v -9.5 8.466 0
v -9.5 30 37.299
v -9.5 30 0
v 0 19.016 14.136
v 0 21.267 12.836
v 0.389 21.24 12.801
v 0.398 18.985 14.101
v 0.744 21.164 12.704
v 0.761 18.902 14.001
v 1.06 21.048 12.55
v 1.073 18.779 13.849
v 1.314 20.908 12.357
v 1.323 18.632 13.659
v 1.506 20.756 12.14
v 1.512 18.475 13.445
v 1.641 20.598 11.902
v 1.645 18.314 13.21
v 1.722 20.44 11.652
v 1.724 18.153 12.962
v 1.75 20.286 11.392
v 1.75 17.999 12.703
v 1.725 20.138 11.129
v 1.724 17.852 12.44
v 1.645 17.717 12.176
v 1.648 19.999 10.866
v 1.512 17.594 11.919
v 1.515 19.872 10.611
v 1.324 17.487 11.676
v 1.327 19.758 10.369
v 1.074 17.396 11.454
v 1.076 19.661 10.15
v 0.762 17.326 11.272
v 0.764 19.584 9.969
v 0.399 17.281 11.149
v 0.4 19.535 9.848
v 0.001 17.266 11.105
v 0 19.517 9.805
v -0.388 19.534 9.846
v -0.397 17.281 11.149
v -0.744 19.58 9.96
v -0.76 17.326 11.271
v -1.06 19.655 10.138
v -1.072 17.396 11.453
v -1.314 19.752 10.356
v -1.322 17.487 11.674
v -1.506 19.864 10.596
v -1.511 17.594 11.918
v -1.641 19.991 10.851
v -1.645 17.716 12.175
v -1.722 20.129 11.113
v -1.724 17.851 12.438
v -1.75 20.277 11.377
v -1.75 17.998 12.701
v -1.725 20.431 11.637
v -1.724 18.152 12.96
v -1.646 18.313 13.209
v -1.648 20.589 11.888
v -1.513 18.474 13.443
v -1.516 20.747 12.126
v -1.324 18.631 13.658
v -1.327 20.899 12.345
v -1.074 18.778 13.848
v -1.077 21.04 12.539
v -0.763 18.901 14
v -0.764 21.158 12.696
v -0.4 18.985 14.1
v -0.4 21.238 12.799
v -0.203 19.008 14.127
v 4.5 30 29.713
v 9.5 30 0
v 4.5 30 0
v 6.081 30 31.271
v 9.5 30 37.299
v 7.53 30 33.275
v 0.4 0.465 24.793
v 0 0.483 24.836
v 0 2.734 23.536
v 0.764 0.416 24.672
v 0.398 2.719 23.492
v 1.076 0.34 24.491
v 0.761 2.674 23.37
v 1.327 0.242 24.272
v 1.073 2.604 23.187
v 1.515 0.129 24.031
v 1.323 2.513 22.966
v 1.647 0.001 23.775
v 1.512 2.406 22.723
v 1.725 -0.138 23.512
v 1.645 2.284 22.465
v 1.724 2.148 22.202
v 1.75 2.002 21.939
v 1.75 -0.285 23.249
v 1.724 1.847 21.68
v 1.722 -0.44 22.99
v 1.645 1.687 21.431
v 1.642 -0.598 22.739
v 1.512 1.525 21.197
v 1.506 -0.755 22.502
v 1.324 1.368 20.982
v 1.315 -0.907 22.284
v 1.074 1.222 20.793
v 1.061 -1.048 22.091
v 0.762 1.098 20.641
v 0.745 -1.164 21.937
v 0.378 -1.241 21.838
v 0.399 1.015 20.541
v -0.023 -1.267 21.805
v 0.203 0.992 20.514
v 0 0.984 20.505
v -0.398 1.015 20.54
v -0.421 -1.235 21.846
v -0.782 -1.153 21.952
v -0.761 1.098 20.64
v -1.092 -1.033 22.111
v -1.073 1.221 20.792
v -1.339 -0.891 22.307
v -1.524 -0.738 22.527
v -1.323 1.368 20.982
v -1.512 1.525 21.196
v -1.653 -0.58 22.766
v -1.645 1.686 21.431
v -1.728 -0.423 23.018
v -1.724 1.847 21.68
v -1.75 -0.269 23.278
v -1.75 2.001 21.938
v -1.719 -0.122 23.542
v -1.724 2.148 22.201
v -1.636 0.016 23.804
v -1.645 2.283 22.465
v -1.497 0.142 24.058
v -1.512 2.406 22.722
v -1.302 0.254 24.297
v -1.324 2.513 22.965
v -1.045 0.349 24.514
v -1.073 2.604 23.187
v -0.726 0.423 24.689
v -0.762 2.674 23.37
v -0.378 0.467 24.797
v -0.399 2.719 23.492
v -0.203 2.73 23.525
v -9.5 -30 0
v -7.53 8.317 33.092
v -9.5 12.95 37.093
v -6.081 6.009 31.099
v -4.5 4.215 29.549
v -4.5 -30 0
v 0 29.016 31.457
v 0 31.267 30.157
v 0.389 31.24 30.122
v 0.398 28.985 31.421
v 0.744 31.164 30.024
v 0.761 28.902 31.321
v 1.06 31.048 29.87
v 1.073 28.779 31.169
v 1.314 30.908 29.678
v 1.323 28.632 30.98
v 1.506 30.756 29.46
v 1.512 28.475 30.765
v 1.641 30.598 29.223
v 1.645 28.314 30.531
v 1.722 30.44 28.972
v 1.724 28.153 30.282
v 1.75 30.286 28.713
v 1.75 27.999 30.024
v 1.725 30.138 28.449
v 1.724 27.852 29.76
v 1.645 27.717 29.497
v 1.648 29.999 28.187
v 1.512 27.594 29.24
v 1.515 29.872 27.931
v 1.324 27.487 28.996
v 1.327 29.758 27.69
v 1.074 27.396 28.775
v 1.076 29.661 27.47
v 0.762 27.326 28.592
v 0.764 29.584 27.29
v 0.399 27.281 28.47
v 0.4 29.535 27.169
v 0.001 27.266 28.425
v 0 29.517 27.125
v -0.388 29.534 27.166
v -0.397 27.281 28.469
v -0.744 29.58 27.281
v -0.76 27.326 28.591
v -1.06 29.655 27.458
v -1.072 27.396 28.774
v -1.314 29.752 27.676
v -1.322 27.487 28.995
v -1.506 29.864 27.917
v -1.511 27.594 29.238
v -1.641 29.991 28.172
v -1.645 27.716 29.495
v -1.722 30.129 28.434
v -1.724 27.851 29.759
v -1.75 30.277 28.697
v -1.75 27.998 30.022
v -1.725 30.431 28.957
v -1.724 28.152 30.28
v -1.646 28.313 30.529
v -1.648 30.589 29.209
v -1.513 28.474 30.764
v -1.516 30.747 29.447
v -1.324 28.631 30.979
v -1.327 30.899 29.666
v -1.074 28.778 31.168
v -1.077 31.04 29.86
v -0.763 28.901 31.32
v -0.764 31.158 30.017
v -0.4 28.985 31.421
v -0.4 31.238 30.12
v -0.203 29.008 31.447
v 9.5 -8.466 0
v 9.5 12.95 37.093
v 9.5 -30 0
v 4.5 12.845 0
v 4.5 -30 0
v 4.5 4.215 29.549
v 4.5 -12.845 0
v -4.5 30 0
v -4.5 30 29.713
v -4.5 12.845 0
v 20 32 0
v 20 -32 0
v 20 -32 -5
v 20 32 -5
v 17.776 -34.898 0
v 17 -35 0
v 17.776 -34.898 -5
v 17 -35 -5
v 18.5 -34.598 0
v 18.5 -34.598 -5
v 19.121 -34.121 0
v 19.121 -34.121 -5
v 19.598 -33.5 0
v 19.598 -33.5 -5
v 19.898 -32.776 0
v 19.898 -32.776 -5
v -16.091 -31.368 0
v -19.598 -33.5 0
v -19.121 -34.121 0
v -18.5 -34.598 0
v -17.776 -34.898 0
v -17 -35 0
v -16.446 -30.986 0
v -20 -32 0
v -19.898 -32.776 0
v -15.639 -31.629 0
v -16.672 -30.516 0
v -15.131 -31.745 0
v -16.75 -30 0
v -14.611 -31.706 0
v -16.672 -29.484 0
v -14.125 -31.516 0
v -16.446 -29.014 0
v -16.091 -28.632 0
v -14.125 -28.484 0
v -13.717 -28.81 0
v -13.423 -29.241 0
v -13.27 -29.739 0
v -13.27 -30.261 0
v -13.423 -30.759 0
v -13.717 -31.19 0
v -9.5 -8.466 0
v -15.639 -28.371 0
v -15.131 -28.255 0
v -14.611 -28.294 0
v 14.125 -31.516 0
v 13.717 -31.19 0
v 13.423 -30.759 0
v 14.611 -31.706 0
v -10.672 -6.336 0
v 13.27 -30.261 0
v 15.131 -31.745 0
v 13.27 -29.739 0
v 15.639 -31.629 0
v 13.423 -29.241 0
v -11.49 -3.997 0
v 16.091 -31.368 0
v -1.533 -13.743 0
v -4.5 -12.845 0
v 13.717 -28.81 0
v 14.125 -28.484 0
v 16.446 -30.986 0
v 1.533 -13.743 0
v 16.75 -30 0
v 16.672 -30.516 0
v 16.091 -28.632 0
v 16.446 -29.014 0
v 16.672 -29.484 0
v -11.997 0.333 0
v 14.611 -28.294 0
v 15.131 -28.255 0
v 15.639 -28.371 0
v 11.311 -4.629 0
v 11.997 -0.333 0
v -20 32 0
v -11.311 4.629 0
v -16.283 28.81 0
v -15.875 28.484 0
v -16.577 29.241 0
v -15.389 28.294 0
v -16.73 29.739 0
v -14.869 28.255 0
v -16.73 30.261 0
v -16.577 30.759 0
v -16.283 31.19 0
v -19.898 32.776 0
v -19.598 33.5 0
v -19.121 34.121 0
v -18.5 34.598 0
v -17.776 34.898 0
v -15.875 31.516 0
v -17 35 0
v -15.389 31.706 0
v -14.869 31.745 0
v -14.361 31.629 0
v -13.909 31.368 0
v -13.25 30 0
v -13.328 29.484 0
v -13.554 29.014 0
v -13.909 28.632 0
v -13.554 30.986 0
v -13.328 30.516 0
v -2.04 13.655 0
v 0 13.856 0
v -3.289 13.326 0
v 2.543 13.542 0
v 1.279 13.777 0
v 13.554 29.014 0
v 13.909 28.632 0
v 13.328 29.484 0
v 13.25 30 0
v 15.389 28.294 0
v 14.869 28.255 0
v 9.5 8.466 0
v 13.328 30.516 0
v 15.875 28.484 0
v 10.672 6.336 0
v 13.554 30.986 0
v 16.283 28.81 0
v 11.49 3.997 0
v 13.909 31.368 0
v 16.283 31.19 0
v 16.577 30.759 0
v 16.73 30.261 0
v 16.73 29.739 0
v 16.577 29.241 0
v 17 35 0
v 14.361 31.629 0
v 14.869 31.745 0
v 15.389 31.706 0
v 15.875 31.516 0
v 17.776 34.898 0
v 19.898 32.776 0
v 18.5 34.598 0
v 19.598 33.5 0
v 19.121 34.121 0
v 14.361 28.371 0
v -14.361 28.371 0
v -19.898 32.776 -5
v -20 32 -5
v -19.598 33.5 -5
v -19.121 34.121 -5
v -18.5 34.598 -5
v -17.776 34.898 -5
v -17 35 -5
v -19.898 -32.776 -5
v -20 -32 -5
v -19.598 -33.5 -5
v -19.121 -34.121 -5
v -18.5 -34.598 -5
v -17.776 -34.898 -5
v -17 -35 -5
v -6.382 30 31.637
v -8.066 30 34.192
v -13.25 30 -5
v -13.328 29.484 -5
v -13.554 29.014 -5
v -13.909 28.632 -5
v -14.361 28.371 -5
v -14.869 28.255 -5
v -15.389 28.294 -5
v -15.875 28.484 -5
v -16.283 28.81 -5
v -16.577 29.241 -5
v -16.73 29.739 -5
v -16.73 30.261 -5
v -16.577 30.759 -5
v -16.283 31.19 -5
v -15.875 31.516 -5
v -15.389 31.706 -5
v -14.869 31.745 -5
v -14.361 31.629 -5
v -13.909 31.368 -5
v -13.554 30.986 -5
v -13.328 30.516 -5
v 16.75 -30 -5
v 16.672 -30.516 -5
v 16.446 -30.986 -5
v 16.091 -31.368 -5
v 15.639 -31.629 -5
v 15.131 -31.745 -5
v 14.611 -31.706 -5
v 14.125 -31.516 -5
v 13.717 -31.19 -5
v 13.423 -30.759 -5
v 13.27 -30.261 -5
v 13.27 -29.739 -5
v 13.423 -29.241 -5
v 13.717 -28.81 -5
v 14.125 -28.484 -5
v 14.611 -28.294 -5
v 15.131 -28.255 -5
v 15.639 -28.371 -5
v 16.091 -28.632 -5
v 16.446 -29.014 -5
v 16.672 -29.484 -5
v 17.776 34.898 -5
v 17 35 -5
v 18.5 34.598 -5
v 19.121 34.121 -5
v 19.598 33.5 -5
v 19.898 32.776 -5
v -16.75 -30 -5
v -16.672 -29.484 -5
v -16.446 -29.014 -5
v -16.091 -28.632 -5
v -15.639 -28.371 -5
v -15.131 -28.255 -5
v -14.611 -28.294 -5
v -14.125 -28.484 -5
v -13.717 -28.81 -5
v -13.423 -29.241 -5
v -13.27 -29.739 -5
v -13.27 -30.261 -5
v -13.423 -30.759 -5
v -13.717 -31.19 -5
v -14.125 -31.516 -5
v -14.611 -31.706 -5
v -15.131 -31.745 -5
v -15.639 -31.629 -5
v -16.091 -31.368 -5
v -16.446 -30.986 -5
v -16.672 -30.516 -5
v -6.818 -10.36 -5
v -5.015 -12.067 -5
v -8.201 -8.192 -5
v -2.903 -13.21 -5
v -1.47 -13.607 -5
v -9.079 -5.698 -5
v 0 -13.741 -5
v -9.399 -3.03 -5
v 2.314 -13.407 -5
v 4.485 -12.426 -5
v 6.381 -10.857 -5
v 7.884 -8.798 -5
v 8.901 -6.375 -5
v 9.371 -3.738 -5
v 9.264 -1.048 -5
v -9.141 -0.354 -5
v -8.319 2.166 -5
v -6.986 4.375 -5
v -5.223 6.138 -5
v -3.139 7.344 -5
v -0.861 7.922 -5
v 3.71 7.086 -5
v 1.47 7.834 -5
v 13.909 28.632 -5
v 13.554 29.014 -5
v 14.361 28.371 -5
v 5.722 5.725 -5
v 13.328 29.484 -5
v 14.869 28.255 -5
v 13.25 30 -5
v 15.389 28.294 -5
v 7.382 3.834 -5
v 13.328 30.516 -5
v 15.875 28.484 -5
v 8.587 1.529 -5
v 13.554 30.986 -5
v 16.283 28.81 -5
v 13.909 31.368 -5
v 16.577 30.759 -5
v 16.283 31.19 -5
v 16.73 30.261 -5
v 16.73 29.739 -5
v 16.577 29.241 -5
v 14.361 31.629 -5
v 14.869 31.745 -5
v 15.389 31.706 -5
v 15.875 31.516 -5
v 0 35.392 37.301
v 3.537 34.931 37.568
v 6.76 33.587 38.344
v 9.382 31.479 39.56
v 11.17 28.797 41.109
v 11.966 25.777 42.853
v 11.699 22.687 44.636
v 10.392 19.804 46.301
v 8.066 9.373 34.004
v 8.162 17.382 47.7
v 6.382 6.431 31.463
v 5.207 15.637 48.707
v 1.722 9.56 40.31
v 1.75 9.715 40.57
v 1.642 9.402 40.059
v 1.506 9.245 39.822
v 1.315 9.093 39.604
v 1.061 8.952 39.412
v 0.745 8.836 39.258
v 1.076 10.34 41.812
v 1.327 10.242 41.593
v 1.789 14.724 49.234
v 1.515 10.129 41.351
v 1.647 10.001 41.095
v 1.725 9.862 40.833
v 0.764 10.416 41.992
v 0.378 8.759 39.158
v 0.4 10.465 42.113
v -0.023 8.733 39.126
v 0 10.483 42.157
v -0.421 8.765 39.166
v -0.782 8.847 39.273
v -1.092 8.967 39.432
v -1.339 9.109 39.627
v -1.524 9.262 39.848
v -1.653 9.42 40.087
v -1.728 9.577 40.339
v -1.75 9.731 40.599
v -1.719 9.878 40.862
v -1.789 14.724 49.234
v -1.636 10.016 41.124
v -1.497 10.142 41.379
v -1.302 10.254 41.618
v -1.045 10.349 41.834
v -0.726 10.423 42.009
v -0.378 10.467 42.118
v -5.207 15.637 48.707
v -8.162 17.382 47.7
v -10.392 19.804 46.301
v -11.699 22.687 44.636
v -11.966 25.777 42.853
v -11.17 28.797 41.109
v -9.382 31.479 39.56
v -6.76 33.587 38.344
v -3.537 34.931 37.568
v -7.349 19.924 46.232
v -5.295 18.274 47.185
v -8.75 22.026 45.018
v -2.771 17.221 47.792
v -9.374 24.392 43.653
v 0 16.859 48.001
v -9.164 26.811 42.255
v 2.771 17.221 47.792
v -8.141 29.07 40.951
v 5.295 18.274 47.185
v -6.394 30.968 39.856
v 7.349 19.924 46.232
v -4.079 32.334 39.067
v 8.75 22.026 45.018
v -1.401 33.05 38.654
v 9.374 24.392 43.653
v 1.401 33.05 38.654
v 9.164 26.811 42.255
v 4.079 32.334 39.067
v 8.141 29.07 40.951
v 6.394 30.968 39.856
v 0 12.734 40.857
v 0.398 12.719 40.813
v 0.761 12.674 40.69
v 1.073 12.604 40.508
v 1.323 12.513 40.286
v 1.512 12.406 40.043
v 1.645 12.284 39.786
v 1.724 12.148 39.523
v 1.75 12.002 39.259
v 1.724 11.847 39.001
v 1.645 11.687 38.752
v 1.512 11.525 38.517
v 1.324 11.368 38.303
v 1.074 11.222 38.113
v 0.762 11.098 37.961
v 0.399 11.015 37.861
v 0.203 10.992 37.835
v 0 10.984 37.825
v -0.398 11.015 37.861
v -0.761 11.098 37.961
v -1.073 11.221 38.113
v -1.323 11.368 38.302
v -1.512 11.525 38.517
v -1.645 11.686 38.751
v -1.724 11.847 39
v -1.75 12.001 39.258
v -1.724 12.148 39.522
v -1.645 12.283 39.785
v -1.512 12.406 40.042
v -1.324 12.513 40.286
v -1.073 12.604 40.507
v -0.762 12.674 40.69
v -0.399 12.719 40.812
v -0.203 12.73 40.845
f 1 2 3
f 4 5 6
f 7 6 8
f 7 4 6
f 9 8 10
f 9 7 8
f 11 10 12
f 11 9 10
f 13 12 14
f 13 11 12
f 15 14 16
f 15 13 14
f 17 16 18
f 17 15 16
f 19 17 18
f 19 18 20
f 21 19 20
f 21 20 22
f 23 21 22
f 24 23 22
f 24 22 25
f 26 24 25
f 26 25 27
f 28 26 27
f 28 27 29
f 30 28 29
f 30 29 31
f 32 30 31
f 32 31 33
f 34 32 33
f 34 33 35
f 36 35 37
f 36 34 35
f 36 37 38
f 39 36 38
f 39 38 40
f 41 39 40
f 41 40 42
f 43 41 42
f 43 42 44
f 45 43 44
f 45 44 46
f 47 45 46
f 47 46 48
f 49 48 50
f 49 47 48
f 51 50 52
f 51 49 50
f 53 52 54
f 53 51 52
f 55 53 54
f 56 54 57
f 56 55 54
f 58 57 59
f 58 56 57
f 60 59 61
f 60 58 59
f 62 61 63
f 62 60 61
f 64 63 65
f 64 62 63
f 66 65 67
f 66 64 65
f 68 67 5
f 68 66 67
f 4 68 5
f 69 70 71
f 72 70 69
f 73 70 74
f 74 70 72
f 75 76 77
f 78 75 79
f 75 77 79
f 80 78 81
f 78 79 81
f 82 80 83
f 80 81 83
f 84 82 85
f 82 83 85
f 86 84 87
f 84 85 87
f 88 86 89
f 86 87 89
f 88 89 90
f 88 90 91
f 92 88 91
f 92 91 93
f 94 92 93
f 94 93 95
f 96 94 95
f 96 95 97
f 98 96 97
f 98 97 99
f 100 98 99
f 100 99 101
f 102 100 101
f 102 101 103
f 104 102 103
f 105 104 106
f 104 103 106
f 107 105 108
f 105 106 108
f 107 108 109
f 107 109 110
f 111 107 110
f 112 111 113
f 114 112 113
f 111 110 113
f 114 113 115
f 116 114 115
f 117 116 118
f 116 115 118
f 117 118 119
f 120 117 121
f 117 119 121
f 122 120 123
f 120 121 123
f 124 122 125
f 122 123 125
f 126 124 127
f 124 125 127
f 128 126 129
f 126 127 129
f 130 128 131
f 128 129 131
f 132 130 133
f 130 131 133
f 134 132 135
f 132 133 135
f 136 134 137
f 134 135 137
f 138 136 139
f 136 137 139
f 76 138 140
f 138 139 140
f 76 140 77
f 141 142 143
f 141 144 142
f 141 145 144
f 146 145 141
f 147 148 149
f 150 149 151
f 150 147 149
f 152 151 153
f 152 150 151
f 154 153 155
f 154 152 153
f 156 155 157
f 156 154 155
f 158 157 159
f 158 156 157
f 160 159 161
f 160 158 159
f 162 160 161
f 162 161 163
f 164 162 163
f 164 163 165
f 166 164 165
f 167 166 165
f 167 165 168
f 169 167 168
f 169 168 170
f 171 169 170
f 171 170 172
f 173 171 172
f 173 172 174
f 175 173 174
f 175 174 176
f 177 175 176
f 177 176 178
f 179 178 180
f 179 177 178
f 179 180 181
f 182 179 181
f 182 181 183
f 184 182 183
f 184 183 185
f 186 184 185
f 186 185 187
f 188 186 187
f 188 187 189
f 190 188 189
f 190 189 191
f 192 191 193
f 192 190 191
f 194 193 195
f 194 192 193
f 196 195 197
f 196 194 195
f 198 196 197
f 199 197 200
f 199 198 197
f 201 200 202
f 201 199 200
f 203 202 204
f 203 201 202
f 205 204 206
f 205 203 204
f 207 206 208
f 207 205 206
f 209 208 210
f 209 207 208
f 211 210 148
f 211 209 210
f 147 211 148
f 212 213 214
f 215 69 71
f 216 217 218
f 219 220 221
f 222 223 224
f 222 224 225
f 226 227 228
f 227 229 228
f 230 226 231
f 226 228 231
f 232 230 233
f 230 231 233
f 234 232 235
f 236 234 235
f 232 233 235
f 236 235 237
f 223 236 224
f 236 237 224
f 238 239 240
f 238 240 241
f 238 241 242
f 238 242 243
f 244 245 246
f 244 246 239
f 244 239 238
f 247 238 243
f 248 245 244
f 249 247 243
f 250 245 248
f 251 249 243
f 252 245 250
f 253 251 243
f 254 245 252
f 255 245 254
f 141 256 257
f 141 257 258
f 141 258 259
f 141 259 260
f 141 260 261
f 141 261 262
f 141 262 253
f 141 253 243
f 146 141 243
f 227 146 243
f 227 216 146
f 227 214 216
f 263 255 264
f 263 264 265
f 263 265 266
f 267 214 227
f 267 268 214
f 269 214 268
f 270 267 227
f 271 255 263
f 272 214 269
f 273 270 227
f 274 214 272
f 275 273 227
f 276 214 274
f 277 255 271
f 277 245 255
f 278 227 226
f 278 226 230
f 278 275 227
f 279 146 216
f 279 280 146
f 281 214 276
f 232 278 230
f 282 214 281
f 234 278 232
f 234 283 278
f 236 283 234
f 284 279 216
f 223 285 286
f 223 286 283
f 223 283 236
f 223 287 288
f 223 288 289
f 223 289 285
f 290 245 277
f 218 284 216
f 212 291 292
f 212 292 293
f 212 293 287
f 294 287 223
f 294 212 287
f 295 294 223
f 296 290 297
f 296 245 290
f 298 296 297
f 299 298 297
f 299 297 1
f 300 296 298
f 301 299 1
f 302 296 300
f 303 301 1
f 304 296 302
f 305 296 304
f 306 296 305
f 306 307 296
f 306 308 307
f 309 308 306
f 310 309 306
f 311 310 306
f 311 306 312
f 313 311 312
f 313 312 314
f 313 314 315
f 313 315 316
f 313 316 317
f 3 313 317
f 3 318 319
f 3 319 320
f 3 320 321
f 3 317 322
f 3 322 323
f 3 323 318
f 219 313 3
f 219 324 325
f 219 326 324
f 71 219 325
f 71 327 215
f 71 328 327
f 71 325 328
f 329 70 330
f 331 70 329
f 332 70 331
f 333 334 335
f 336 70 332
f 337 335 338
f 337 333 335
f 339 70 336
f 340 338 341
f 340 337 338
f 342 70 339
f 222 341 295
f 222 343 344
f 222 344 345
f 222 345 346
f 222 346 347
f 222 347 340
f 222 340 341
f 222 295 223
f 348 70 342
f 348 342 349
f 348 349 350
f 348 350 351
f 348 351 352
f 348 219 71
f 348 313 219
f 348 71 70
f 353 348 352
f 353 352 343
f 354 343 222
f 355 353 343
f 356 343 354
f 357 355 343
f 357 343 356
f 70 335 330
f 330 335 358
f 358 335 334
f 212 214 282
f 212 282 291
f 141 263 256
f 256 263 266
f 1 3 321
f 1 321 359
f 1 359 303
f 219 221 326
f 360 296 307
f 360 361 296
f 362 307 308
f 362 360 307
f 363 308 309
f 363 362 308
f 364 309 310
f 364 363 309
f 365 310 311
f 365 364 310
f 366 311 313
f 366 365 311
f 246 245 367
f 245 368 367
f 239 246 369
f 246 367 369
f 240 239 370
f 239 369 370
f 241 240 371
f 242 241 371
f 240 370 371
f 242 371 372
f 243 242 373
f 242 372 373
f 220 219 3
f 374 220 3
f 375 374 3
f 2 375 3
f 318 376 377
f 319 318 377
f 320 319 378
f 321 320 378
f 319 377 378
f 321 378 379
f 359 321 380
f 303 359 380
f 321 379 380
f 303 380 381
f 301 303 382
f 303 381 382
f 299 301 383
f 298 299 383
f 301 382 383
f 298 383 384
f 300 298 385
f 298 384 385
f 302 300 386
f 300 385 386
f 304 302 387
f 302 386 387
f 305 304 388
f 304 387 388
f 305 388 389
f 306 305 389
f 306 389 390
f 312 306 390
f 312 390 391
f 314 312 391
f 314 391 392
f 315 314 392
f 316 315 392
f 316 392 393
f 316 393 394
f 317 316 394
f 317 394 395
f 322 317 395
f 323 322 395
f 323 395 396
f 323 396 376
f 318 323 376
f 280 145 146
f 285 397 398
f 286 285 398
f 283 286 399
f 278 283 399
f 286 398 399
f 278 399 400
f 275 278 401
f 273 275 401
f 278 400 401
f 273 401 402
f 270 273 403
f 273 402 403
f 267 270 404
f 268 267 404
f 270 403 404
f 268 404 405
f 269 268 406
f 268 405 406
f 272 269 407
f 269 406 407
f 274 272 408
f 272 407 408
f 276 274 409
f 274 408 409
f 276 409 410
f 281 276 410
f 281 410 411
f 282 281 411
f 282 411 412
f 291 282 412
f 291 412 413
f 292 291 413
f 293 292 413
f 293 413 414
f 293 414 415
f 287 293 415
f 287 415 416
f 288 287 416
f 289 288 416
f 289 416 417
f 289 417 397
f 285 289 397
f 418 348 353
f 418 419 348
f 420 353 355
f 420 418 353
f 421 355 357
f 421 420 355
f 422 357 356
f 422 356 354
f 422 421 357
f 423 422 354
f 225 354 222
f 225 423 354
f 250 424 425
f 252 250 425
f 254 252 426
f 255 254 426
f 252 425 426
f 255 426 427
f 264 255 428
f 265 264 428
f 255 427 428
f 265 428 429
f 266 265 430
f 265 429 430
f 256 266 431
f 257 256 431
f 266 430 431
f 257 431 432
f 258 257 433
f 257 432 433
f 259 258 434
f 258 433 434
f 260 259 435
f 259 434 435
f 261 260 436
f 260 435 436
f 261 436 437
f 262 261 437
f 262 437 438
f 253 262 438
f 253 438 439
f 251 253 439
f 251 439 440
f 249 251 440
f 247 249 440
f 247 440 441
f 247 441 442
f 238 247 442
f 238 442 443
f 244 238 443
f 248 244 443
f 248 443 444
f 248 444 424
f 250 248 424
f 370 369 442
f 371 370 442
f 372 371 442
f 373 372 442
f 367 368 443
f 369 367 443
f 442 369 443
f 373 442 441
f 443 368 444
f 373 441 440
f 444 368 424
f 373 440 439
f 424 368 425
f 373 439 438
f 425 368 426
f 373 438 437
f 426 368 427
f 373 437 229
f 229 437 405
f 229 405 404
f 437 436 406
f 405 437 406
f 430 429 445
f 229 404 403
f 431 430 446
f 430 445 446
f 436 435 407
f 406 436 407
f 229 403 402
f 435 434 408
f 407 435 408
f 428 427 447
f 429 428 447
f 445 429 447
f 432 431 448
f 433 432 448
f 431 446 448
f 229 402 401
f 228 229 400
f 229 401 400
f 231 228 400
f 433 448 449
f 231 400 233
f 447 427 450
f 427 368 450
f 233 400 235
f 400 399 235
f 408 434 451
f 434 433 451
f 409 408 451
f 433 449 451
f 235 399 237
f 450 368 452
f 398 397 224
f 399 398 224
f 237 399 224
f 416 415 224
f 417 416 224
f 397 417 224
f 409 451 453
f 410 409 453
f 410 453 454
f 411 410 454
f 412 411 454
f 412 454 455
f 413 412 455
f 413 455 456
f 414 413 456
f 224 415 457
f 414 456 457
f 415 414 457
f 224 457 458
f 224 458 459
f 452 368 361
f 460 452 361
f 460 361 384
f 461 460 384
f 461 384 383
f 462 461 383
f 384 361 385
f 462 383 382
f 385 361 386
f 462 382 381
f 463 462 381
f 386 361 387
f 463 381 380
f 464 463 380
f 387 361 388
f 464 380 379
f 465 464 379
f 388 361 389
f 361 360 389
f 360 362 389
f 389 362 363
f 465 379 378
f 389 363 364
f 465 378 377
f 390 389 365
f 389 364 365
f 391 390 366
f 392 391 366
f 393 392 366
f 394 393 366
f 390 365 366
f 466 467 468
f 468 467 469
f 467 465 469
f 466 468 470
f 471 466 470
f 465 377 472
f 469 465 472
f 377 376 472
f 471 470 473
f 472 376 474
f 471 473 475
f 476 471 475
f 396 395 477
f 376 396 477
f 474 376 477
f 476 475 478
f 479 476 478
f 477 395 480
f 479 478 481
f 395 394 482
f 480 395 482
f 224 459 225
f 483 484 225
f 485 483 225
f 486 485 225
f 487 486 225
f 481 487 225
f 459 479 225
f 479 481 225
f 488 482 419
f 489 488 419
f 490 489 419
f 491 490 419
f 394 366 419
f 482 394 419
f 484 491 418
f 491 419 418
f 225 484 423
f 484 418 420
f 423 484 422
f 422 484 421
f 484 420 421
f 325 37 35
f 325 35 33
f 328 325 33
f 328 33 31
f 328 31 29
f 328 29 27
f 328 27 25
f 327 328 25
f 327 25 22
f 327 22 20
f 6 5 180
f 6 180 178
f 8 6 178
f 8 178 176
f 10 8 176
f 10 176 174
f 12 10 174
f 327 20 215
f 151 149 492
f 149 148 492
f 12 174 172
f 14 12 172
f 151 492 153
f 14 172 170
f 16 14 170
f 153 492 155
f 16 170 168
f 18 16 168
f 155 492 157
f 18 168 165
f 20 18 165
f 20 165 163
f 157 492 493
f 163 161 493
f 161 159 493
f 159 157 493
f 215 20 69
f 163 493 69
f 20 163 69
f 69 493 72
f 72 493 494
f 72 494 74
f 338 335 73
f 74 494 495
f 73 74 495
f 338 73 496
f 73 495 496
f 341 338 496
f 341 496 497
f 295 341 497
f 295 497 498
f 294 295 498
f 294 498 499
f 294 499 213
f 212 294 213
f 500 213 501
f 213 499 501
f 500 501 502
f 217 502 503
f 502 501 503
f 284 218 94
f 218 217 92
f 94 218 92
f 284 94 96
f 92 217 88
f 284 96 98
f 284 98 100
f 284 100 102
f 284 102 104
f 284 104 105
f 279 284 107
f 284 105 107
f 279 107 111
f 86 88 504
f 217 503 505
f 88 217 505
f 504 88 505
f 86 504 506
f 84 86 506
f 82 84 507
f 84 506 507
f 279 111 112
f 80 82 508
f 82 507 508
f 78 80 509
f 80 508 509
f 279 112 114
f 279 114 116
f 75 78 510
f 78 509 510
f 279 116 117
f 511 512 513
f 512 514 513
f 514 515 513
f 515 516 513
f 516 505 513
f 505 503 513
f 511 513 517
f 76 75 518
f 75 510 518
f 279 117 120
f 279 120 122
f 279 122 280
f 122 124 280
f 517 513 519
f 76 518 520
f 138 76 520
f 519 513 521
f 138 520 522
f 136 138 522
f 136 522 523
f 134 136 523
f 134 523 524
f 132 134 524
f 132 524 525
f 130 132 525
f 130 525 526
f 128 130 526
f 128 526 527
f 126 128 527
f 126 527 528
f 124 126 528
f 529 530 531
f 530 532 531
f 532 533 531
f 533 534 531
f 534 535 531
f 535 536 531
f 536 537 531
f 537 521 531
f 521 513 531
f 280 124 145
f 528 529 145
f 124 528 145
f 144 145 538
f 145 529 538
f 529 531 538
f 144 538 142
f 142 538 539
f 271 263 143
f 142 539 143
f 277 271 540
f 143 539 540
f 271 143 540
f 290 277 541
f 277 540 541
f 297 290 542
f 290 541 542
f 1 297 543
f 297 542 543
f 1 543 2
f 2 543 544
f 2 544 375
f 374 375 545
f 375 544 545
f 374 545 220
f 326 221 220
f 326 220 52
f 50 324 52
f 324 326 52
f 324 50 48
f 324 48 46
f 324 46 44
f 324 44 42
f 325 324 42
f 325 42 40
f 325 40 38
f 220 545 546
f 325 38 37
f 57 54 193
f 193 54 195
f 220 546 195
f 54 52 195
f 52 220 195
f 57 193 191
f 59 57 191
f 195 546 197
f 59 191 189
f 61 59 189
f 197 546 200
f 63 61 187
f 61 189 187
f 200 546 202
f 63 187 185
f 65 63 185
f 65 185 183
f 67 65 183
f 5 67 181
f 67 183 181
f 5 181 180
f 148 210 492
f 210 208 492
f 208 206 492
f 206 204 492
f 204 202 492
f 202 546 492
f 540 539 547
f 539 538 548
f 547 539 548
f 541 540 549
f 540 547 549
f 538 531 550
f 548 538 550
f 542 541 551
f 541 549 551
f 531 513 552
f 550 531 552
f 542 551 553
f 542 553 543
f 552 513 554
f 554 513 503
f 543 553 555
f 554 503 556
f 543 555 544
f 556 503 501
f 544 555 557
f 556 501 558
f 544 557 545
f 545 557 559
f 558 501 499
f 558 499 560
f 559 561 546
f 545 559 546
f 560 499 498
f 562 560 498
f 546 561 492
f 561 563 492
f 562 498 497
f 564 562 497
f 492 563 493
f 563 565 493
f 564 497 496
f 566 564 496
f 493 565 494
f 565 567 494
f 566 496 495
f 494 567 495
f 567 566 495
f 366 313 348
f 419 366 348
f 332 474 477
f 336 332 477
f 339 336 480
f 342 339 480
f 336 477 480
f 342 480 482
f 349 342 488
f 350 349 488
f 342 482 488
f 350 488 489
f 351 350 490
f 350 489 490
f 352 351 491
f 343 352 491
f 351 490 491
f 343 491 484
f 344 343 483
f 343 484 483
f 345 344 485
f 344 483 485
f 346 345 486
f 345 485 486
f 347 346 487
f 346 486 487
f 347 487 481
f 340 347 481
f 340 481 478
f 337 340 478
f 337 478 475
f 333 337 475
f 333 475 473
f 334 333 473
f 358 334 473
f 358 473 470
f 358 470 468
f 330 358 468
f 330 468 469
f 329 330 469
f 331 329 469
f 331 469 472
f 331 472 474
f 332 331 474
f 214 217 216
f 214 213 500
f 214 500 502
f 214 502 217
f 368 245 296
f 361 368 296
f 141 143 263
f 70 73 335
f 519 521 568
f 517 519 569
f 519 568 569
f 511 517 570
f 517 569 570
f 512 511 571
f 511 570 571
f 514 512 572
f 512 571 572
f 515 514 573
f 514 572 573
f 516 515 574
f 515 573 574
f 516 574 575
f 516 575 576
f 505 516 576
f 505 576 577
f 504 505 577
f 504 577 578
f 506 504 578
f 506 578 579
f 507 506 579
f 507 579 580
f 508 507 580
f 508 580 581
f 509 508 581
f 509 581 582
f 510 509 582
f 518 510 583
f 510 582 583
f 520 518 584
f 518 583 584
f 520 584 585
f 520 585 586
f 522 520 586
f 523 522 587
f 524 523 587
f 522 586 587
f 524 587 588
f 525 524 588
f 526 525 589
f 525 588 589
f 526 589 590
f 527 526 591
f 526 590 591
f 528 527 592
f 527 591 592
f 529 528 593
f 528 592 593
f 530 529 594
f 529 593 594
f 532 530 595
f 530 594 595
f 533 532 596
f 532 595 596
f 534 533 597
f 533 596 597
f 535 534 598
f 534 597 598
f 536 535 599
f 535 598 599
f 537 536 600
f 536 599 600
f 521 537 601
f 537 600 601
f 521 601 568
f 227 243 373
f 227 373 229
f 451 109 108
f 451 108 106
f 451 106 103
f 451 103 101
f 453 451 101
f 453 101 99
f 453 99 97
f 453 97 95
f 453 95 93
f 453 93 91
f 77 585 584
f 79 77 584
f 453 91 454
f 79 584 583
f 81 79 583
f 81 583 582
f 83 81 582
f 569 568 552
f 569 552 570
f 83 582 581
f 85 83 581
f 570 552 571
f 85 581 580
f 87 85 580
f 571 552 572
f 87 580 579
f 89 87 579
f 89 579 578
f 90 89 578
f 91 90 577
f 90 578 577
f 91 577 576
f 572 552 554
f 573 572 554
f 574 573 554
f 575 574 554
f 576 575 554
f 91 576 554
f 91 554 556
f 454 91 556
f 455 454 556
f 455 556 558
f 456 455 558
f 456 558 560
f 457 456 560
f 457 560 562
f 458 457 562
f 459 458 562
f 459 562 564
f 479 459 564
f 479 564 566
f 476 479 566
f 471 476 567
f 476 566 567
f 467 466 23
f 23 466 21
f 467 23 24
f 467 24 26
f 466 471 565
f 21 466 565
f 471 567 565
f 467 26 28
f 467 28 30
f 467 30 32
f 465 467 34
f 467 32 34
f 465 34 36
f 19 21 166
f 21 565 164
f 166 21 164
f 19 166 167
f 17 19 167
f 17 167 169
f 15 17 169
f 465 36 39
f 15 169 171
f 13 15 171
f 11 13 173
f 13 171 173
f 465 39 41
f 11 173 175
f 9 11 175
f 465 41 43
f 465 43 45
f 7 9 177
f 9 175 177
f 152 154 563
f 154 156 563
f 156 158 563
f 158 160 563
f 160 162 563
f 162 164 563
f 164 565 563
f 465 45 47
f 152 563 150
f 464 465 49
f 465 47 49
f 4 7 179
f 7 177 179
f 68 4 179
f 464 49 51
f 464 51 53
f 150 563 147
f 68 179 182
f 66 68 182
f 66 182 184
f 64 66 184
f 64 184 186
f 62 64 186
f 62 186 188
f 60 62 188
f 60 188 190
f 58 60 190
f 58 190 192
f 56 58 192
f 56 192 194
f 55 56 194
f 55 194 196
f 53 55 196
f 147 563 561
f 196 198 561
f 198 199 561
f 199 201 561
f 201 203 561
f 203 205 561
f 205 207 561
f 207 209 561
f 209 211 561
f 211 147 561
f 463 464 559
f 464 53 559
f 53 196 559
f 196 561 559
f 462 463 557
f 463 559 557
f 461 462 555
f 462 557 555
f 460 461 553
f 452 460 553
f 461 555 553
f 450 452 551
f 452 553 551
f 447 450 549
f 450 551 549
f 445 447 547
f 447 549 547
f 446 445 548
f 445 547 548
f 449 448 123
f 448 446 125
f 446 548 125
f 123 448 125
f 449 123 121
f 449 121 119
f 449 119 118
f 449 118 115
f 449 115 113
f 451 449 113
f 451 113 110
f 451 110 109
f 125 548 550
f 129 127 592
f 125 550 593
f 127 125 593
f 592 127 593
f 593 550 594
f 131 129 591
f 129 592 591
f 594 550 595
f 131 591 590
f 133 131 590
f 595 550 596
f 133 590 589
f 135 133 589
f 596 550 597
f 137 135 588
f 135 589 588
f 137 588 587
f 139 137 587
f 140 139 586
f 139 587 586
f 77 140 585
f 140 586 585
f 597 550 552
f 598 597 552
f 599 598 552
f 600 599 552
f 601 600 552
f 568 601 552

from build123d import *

# Parameters (mm, degrees)
SKETCH_1_W                           = 40
SKETCH_1_H                           = 70
EXTRUDE_1_DEPTH                      = 5
EXTRUDE_2_REACH                      = 92.62
EXTRUDE_START                        = -50
SKETCH_2_R                           = 12
CUT_EXTRUDE_1_REACH                  = 69.832
SKETCH_4_R                           = 1.75
FILLET_1_R                           = 3
EXTRUDE_START_2                      = 7
EXTRUDE_3_DEPTH                      = 2.5
EXTRUDE_START_3                      = -7
EXTRUDE_4_DEPTH                      = 2.5
SKETCH_5_R                           = 9.4
CUT_EXTRUDE_2_DEPTH                  = 80.580228084
CUT_EXTRUDE_3_REACH                  = 65.9
CUT_EXTRUDE_3_END_RADIUS             = 12
SKETCH_7_R                           = 1.75
CUT_EXTRUDE_3_DIRECTION_2_REACH      = 65.9
CUT_EXTRUDE_3_DIRECTION_2_END_RADIUS = 12


with BuildPart() as part:
    # ｽｹｯﾁ1 → ﾎﾞｽ - 押し出し1 (new body)
    with BuildSketch(Plane.XY):
        Rectangle(SKETCH_1_W, SKETCH_1_H)
    extrude(amount=-EXTRUDE_1_DEPTH)

    # ﾎﾞｽ - 押し出し2: up to this plane
    extrude_2_end = Plane(origin=(0, 0, 0), z_dir=(0, 0, 1))
    # ｽｹｯﾁ2 → ﾎﾞｽ - 押し出し2 (add, up to the surface)
    with BuildSketch(Plane(origin=(0, 0, 0), x_dir=(1, 0, 0), z_dir=(0, -0.49999999999999495, -0.8660254037844416)).offset(EXTRUDE_START), mode=Mode.PRIVATE) as extrude_2_sk1:
        with Locations(Location((0, 0, 0), (0, 0, 270))):
            Circle(SKETCH_2_R)
    extrude_2_tool1 = split(extrude(extrude_2_sk1.sketch, amount=EXTRUDE_2_REACH, mode=Mode.PRIVATE), bisect_by=extrude_2_end, keep=Keep.BOTH, mode=Mode.PRIVATE)
    add(extrude_2_tool1.solids().sort_by_distance((0, 25, 43.30127))[0])

    # ｽｹｯﾁ4 → ｶｯﾄ - 押し出し1 (cut, up to next)
    with BuildSketch(Plane(origin=(0, 0, -5), x_dir=(-1, 0, 0), z_dir=(0, 0, -1)), mode=Mode.PRIVATE) as cut_extrude_1_sk1:
        with Locations((-15, 30)):
            Circle(SKETCH_4_R)
    cut_extrude_1_tool1 = extrude(cut_extrude_1_sk1.sketch, amount=-CUT_EXTRUDE_1_REACH, mode=Mode.PRIVATE) & part.part
    # ｽｹｯﾁ4 → ｶｯﾄ - 押し出し1 (cut, up to next)
    with BuildSketch(Plane(origin=(0, 0, -5), x_dir=(-1, 0, 0), z_dir=(0, 0, -1)), mode=Mode.PRIVATE) as cut_extrude_1_sk2:
        with Locations(Location((15, 30, 0), (0, 0, 180))):
            Circle(SKETCH_4_R)
    cut_extrude_1_tool2 = extrude(cut_extrude_1_sk2.sketch, amount=-CUT_EXTRUDE_1_REACH, mode=Mode.PRIVATE) & part.part
    # ｽｹｯﾁ4 → ｶｯﾄ - 押し出し1 (cut, up to next)
    with BuildSketch(Plane(origin=(0, 0, -5), x_dir=(-1, 0, 0), z_dir=(0, 0, -1)), mode=Mode.PRIVATE) as cut_extrude_1_sk3:
        with Locations((15, -30)):
            Circle(SKETCH_4_R)
    cut_extrude_1_tool3 = extrude(cut_extrude_1_sk3.sketch, amount=-CUT_EXTRUDE_1_REACH, mode=Mode.PRIVATE) & part.part
    # ｽｹｯﾁ4 → ｶｯﾄ - 押し出し1 (cut, up to next)
    with BuildSketch(Plane(origin=(0, 0, -5), x_dir=(-1, 0, 0), z_dir=(0, 0, -1)), mode=Mode.PRIVATE) as cut_extrude_1_sk4:
        with Locations(Location((-15, -30, 0), (0, 0, 180))):
            Circle(SKETCH_4_R)
    cut_extrude_1_tool4 = extrude(cut_extrude_1_sk4.sketch, amount=-CUT_EXTRUDE_1_REACH, mode=Mode.PRIVATE) & part.part
    add(cut_extrude_1_tool1.solids().sort_by_distance((15, 30, -5))[0], mode=Mode.SUBTRACT)
    add(cut_extrude_1_tool2.solids().sort_by_distance((-15, 30, -5))[0], mode=Mode.SUBTRACT)
    add(cut_extrude_1_tool3.solids().sort_by_distance((-15, -30, -5))[0], mode=Mode.SUBTRACT)
    add(cut_extrude_1_tool4.solids().sort_by_distance((15, -30, -5))[0], mode=Mode.SUBTRACT)

    # ﾌｨﾚｯﾄ1
    fillet_1_edges = [part.edges().sort_by_distance(p)[0] for p in [
        (20, -35, -2.5),
        (-20, -35, -2.5),
        (-20, 35, -2.5),
        (20, 35, -2.5),
    ]]
    fillet(fillet_1_edges, radius=FILLET_1_R)

    # ｽｹｯﾁ6 → ﾎﾞｽ - 押し出し3 (add, symmetric)
    with BuildSketch(Plane(origin=(0, 0, 0), x_dir=(0, 0, -1), z_dir=(1, 0, 0)).offset(EXTRUDE_START_2)):
        Polygon((0, 30), (-38, 30), (-38, 14), (0, -30), align=None)
    extrude(amount=EXTRUDE_3_DEPTH, both=True)

    # ｽｹｯﾁ6<2> → ﾎﾞｽ - 押し出し4 (add, symmetric)
    with BuildSketch(Plane(origin=(0, 0, 0), x_dir=(0, 0, -1), z_dir=(1, 0, 0)).offset(EXTRUDE_START_3)):
        Polygon((0, 30), (-38, 30), (-38, 14), (0, -30), align=None)
    extrude(amount=EXTRUDE_4_DEPTH, both=True)

    # ｽｹｯﾁ5 → ｶｯﾄ - 押し出し2 (cut, through all)
    with BuildSketch(Plane(origin=(0, 25, 43.301270189), x_dir=(1, 0, 0), z_dir=(0, 0.49999999999999495, 0.8660254037844416))):
        with Locations(Location((0, 0, 0), (0, 0, 270))):
            Circle(SKETCH_5_R)
    extrude(amount=-CUT_EXTRUDE_2_DEPTH, mode=Mode.SUBTRACT)

    # ｶｯﾄ - 押し出し3: up to this cylinder (the profile starts inside it)
    cut_extrude_3_end = Plane(origin=(0, 14.999999951, 25.980762028), z_dir=(0, 0.4999999999999949, 0.8660254037844416)) * Cylinder(CUT_EXTRUDE_3_END_RADIUS, 176.799999934, mode=Mode.PRIVATE)
    # ｽｹｯﾁ7 → ｶｯﾄ - 押し出し3 (cut, up to the surface)
    with BuildSketch(Plane(origin=(0, 0, 0), x_dir=(1, 0, 0), z_dir=(0, 0.8660254037844416, -0.49999999999999495)), mode=Mode.PRIVATE) as cut_extrude_3_sk1:
        with Locations(Location((0, -20, 0), (0, 0, 270))):
            Circle(SKETCH_7_R)
    cut_extrude_3_tool1 = extrude(cut_extrude_3_sk1.sketch, amount=-CUT_EXTRUDE_3_REACH, mode=Mode.PRIVATE) & cut_extrude_3_end
    add(cut_extrude_3_tool1.solids().sort_by_distance((0, 10, 17.320508))[0], mode=Mode.SUBTRACT)
    # ｽｹｯﾁ7 → ｶｯﾄ - 押し出し3 (cut, up to the surface)
    with BuildSketch(Plane(origin=(0, 0, 0), x_dir=(1, 0, 0), z_dir=(0, 0.8660254037844416, -0.49999999999999495)), mode=Mode.PRIVATE) as cut_extrude_3_sk2:
        with Locations(Location((0, -40, 0), (0, 0, 270))):
            Circle(SKETCH_7_R)
    cut_extrude_3_tool2 = extrude(cut_extrude_3_sk2.sketch, amount=-CUT_EXTRUDE_3_REACH, mode=Mode.PRIVATE) & cut_extrude_3_end
    add(cut_extrude_3_tool2.solids().sort_by_distance((0, 20, 34.641016))[0], mode=Mode.SUBTRACT)

    # ｶｯﾄ - 押し出し3 direction 2: up to this cylinder (the profile starts inside it)
    cut_extrude_3_direction_2_end = Plane(origin=(0, 14.999999951, 25.980762028), z_dir=(0, 0.4999999999999949, 0.8660254037844416)) * Cylinder(CUT_EXTRUDE_3_DIRECTION_2_END_RADIUS, 176.799999934, mode=Mode.PRIVATE)
    # ｽｹｯﾁ7 → ｶｯﾄ - 押し出し3 direction 2 (cut, up to the surface)
    with BuildSketch(Plane(origin=(0, 0, 0), x_dir=(1, 0, 0), z_dir=(0, 0.8660254037844416, -0.49999999999999495)), mode=Mode.PRIVATE) as cut_extrude_3_direction_2_sk1:
        with Locations(Location((0, -20, 0), (0, 0, 270))):
            Circle(SKETCH_7_R)
    cut_extrude_3_direction_2_tool1 = extrude(cut_extrude_3_direction_2_sk1.sketch, amount=CUT_EXTRUDE_3_DIRECTION_2_REACH, mode=Mode.PRIVATE) & cut_extrude_3_direction_2_end
    add(cut_extrude_3_direction_2_tool1.solids().sort_by_distance((0, 10, 17.320508))[0], mode=Mode.SUBTRACT)
    # ｽｹｯﾁ7 → ｶｯﾄ - 押し出し3 direction 2 (cut, up to the surface)
    with BuildSketch(Plane(origin=(0, 0, 0), x_dir=(1, 0, 0), z_dir=(0, 0.8660254037844416, -0.49999999999999495)), mode=Mode.PRIVATE) as cut_extrude_3_direction_2_sk2:
        with Locations(Location((0, -40, 0), (0, 0, 270))):
            Circle(SKETCH_7_R)
    cut_extrude_3_direction_2_tool2 = extrude(cut_extrude_3_direction_2_sk2.sketch, amount=CUT_EXTRUDE_3_DIRECTION_2_REACH, mode=Mode.PRIVATE) & cut_extrude_3_direction_2_end
    add(cut_extrude_3_direction_2_tool2.solids().sort_by_distance((0, 20, 34.641016))[0], mode=Mode.SUBTRACT)


solid = part.part
